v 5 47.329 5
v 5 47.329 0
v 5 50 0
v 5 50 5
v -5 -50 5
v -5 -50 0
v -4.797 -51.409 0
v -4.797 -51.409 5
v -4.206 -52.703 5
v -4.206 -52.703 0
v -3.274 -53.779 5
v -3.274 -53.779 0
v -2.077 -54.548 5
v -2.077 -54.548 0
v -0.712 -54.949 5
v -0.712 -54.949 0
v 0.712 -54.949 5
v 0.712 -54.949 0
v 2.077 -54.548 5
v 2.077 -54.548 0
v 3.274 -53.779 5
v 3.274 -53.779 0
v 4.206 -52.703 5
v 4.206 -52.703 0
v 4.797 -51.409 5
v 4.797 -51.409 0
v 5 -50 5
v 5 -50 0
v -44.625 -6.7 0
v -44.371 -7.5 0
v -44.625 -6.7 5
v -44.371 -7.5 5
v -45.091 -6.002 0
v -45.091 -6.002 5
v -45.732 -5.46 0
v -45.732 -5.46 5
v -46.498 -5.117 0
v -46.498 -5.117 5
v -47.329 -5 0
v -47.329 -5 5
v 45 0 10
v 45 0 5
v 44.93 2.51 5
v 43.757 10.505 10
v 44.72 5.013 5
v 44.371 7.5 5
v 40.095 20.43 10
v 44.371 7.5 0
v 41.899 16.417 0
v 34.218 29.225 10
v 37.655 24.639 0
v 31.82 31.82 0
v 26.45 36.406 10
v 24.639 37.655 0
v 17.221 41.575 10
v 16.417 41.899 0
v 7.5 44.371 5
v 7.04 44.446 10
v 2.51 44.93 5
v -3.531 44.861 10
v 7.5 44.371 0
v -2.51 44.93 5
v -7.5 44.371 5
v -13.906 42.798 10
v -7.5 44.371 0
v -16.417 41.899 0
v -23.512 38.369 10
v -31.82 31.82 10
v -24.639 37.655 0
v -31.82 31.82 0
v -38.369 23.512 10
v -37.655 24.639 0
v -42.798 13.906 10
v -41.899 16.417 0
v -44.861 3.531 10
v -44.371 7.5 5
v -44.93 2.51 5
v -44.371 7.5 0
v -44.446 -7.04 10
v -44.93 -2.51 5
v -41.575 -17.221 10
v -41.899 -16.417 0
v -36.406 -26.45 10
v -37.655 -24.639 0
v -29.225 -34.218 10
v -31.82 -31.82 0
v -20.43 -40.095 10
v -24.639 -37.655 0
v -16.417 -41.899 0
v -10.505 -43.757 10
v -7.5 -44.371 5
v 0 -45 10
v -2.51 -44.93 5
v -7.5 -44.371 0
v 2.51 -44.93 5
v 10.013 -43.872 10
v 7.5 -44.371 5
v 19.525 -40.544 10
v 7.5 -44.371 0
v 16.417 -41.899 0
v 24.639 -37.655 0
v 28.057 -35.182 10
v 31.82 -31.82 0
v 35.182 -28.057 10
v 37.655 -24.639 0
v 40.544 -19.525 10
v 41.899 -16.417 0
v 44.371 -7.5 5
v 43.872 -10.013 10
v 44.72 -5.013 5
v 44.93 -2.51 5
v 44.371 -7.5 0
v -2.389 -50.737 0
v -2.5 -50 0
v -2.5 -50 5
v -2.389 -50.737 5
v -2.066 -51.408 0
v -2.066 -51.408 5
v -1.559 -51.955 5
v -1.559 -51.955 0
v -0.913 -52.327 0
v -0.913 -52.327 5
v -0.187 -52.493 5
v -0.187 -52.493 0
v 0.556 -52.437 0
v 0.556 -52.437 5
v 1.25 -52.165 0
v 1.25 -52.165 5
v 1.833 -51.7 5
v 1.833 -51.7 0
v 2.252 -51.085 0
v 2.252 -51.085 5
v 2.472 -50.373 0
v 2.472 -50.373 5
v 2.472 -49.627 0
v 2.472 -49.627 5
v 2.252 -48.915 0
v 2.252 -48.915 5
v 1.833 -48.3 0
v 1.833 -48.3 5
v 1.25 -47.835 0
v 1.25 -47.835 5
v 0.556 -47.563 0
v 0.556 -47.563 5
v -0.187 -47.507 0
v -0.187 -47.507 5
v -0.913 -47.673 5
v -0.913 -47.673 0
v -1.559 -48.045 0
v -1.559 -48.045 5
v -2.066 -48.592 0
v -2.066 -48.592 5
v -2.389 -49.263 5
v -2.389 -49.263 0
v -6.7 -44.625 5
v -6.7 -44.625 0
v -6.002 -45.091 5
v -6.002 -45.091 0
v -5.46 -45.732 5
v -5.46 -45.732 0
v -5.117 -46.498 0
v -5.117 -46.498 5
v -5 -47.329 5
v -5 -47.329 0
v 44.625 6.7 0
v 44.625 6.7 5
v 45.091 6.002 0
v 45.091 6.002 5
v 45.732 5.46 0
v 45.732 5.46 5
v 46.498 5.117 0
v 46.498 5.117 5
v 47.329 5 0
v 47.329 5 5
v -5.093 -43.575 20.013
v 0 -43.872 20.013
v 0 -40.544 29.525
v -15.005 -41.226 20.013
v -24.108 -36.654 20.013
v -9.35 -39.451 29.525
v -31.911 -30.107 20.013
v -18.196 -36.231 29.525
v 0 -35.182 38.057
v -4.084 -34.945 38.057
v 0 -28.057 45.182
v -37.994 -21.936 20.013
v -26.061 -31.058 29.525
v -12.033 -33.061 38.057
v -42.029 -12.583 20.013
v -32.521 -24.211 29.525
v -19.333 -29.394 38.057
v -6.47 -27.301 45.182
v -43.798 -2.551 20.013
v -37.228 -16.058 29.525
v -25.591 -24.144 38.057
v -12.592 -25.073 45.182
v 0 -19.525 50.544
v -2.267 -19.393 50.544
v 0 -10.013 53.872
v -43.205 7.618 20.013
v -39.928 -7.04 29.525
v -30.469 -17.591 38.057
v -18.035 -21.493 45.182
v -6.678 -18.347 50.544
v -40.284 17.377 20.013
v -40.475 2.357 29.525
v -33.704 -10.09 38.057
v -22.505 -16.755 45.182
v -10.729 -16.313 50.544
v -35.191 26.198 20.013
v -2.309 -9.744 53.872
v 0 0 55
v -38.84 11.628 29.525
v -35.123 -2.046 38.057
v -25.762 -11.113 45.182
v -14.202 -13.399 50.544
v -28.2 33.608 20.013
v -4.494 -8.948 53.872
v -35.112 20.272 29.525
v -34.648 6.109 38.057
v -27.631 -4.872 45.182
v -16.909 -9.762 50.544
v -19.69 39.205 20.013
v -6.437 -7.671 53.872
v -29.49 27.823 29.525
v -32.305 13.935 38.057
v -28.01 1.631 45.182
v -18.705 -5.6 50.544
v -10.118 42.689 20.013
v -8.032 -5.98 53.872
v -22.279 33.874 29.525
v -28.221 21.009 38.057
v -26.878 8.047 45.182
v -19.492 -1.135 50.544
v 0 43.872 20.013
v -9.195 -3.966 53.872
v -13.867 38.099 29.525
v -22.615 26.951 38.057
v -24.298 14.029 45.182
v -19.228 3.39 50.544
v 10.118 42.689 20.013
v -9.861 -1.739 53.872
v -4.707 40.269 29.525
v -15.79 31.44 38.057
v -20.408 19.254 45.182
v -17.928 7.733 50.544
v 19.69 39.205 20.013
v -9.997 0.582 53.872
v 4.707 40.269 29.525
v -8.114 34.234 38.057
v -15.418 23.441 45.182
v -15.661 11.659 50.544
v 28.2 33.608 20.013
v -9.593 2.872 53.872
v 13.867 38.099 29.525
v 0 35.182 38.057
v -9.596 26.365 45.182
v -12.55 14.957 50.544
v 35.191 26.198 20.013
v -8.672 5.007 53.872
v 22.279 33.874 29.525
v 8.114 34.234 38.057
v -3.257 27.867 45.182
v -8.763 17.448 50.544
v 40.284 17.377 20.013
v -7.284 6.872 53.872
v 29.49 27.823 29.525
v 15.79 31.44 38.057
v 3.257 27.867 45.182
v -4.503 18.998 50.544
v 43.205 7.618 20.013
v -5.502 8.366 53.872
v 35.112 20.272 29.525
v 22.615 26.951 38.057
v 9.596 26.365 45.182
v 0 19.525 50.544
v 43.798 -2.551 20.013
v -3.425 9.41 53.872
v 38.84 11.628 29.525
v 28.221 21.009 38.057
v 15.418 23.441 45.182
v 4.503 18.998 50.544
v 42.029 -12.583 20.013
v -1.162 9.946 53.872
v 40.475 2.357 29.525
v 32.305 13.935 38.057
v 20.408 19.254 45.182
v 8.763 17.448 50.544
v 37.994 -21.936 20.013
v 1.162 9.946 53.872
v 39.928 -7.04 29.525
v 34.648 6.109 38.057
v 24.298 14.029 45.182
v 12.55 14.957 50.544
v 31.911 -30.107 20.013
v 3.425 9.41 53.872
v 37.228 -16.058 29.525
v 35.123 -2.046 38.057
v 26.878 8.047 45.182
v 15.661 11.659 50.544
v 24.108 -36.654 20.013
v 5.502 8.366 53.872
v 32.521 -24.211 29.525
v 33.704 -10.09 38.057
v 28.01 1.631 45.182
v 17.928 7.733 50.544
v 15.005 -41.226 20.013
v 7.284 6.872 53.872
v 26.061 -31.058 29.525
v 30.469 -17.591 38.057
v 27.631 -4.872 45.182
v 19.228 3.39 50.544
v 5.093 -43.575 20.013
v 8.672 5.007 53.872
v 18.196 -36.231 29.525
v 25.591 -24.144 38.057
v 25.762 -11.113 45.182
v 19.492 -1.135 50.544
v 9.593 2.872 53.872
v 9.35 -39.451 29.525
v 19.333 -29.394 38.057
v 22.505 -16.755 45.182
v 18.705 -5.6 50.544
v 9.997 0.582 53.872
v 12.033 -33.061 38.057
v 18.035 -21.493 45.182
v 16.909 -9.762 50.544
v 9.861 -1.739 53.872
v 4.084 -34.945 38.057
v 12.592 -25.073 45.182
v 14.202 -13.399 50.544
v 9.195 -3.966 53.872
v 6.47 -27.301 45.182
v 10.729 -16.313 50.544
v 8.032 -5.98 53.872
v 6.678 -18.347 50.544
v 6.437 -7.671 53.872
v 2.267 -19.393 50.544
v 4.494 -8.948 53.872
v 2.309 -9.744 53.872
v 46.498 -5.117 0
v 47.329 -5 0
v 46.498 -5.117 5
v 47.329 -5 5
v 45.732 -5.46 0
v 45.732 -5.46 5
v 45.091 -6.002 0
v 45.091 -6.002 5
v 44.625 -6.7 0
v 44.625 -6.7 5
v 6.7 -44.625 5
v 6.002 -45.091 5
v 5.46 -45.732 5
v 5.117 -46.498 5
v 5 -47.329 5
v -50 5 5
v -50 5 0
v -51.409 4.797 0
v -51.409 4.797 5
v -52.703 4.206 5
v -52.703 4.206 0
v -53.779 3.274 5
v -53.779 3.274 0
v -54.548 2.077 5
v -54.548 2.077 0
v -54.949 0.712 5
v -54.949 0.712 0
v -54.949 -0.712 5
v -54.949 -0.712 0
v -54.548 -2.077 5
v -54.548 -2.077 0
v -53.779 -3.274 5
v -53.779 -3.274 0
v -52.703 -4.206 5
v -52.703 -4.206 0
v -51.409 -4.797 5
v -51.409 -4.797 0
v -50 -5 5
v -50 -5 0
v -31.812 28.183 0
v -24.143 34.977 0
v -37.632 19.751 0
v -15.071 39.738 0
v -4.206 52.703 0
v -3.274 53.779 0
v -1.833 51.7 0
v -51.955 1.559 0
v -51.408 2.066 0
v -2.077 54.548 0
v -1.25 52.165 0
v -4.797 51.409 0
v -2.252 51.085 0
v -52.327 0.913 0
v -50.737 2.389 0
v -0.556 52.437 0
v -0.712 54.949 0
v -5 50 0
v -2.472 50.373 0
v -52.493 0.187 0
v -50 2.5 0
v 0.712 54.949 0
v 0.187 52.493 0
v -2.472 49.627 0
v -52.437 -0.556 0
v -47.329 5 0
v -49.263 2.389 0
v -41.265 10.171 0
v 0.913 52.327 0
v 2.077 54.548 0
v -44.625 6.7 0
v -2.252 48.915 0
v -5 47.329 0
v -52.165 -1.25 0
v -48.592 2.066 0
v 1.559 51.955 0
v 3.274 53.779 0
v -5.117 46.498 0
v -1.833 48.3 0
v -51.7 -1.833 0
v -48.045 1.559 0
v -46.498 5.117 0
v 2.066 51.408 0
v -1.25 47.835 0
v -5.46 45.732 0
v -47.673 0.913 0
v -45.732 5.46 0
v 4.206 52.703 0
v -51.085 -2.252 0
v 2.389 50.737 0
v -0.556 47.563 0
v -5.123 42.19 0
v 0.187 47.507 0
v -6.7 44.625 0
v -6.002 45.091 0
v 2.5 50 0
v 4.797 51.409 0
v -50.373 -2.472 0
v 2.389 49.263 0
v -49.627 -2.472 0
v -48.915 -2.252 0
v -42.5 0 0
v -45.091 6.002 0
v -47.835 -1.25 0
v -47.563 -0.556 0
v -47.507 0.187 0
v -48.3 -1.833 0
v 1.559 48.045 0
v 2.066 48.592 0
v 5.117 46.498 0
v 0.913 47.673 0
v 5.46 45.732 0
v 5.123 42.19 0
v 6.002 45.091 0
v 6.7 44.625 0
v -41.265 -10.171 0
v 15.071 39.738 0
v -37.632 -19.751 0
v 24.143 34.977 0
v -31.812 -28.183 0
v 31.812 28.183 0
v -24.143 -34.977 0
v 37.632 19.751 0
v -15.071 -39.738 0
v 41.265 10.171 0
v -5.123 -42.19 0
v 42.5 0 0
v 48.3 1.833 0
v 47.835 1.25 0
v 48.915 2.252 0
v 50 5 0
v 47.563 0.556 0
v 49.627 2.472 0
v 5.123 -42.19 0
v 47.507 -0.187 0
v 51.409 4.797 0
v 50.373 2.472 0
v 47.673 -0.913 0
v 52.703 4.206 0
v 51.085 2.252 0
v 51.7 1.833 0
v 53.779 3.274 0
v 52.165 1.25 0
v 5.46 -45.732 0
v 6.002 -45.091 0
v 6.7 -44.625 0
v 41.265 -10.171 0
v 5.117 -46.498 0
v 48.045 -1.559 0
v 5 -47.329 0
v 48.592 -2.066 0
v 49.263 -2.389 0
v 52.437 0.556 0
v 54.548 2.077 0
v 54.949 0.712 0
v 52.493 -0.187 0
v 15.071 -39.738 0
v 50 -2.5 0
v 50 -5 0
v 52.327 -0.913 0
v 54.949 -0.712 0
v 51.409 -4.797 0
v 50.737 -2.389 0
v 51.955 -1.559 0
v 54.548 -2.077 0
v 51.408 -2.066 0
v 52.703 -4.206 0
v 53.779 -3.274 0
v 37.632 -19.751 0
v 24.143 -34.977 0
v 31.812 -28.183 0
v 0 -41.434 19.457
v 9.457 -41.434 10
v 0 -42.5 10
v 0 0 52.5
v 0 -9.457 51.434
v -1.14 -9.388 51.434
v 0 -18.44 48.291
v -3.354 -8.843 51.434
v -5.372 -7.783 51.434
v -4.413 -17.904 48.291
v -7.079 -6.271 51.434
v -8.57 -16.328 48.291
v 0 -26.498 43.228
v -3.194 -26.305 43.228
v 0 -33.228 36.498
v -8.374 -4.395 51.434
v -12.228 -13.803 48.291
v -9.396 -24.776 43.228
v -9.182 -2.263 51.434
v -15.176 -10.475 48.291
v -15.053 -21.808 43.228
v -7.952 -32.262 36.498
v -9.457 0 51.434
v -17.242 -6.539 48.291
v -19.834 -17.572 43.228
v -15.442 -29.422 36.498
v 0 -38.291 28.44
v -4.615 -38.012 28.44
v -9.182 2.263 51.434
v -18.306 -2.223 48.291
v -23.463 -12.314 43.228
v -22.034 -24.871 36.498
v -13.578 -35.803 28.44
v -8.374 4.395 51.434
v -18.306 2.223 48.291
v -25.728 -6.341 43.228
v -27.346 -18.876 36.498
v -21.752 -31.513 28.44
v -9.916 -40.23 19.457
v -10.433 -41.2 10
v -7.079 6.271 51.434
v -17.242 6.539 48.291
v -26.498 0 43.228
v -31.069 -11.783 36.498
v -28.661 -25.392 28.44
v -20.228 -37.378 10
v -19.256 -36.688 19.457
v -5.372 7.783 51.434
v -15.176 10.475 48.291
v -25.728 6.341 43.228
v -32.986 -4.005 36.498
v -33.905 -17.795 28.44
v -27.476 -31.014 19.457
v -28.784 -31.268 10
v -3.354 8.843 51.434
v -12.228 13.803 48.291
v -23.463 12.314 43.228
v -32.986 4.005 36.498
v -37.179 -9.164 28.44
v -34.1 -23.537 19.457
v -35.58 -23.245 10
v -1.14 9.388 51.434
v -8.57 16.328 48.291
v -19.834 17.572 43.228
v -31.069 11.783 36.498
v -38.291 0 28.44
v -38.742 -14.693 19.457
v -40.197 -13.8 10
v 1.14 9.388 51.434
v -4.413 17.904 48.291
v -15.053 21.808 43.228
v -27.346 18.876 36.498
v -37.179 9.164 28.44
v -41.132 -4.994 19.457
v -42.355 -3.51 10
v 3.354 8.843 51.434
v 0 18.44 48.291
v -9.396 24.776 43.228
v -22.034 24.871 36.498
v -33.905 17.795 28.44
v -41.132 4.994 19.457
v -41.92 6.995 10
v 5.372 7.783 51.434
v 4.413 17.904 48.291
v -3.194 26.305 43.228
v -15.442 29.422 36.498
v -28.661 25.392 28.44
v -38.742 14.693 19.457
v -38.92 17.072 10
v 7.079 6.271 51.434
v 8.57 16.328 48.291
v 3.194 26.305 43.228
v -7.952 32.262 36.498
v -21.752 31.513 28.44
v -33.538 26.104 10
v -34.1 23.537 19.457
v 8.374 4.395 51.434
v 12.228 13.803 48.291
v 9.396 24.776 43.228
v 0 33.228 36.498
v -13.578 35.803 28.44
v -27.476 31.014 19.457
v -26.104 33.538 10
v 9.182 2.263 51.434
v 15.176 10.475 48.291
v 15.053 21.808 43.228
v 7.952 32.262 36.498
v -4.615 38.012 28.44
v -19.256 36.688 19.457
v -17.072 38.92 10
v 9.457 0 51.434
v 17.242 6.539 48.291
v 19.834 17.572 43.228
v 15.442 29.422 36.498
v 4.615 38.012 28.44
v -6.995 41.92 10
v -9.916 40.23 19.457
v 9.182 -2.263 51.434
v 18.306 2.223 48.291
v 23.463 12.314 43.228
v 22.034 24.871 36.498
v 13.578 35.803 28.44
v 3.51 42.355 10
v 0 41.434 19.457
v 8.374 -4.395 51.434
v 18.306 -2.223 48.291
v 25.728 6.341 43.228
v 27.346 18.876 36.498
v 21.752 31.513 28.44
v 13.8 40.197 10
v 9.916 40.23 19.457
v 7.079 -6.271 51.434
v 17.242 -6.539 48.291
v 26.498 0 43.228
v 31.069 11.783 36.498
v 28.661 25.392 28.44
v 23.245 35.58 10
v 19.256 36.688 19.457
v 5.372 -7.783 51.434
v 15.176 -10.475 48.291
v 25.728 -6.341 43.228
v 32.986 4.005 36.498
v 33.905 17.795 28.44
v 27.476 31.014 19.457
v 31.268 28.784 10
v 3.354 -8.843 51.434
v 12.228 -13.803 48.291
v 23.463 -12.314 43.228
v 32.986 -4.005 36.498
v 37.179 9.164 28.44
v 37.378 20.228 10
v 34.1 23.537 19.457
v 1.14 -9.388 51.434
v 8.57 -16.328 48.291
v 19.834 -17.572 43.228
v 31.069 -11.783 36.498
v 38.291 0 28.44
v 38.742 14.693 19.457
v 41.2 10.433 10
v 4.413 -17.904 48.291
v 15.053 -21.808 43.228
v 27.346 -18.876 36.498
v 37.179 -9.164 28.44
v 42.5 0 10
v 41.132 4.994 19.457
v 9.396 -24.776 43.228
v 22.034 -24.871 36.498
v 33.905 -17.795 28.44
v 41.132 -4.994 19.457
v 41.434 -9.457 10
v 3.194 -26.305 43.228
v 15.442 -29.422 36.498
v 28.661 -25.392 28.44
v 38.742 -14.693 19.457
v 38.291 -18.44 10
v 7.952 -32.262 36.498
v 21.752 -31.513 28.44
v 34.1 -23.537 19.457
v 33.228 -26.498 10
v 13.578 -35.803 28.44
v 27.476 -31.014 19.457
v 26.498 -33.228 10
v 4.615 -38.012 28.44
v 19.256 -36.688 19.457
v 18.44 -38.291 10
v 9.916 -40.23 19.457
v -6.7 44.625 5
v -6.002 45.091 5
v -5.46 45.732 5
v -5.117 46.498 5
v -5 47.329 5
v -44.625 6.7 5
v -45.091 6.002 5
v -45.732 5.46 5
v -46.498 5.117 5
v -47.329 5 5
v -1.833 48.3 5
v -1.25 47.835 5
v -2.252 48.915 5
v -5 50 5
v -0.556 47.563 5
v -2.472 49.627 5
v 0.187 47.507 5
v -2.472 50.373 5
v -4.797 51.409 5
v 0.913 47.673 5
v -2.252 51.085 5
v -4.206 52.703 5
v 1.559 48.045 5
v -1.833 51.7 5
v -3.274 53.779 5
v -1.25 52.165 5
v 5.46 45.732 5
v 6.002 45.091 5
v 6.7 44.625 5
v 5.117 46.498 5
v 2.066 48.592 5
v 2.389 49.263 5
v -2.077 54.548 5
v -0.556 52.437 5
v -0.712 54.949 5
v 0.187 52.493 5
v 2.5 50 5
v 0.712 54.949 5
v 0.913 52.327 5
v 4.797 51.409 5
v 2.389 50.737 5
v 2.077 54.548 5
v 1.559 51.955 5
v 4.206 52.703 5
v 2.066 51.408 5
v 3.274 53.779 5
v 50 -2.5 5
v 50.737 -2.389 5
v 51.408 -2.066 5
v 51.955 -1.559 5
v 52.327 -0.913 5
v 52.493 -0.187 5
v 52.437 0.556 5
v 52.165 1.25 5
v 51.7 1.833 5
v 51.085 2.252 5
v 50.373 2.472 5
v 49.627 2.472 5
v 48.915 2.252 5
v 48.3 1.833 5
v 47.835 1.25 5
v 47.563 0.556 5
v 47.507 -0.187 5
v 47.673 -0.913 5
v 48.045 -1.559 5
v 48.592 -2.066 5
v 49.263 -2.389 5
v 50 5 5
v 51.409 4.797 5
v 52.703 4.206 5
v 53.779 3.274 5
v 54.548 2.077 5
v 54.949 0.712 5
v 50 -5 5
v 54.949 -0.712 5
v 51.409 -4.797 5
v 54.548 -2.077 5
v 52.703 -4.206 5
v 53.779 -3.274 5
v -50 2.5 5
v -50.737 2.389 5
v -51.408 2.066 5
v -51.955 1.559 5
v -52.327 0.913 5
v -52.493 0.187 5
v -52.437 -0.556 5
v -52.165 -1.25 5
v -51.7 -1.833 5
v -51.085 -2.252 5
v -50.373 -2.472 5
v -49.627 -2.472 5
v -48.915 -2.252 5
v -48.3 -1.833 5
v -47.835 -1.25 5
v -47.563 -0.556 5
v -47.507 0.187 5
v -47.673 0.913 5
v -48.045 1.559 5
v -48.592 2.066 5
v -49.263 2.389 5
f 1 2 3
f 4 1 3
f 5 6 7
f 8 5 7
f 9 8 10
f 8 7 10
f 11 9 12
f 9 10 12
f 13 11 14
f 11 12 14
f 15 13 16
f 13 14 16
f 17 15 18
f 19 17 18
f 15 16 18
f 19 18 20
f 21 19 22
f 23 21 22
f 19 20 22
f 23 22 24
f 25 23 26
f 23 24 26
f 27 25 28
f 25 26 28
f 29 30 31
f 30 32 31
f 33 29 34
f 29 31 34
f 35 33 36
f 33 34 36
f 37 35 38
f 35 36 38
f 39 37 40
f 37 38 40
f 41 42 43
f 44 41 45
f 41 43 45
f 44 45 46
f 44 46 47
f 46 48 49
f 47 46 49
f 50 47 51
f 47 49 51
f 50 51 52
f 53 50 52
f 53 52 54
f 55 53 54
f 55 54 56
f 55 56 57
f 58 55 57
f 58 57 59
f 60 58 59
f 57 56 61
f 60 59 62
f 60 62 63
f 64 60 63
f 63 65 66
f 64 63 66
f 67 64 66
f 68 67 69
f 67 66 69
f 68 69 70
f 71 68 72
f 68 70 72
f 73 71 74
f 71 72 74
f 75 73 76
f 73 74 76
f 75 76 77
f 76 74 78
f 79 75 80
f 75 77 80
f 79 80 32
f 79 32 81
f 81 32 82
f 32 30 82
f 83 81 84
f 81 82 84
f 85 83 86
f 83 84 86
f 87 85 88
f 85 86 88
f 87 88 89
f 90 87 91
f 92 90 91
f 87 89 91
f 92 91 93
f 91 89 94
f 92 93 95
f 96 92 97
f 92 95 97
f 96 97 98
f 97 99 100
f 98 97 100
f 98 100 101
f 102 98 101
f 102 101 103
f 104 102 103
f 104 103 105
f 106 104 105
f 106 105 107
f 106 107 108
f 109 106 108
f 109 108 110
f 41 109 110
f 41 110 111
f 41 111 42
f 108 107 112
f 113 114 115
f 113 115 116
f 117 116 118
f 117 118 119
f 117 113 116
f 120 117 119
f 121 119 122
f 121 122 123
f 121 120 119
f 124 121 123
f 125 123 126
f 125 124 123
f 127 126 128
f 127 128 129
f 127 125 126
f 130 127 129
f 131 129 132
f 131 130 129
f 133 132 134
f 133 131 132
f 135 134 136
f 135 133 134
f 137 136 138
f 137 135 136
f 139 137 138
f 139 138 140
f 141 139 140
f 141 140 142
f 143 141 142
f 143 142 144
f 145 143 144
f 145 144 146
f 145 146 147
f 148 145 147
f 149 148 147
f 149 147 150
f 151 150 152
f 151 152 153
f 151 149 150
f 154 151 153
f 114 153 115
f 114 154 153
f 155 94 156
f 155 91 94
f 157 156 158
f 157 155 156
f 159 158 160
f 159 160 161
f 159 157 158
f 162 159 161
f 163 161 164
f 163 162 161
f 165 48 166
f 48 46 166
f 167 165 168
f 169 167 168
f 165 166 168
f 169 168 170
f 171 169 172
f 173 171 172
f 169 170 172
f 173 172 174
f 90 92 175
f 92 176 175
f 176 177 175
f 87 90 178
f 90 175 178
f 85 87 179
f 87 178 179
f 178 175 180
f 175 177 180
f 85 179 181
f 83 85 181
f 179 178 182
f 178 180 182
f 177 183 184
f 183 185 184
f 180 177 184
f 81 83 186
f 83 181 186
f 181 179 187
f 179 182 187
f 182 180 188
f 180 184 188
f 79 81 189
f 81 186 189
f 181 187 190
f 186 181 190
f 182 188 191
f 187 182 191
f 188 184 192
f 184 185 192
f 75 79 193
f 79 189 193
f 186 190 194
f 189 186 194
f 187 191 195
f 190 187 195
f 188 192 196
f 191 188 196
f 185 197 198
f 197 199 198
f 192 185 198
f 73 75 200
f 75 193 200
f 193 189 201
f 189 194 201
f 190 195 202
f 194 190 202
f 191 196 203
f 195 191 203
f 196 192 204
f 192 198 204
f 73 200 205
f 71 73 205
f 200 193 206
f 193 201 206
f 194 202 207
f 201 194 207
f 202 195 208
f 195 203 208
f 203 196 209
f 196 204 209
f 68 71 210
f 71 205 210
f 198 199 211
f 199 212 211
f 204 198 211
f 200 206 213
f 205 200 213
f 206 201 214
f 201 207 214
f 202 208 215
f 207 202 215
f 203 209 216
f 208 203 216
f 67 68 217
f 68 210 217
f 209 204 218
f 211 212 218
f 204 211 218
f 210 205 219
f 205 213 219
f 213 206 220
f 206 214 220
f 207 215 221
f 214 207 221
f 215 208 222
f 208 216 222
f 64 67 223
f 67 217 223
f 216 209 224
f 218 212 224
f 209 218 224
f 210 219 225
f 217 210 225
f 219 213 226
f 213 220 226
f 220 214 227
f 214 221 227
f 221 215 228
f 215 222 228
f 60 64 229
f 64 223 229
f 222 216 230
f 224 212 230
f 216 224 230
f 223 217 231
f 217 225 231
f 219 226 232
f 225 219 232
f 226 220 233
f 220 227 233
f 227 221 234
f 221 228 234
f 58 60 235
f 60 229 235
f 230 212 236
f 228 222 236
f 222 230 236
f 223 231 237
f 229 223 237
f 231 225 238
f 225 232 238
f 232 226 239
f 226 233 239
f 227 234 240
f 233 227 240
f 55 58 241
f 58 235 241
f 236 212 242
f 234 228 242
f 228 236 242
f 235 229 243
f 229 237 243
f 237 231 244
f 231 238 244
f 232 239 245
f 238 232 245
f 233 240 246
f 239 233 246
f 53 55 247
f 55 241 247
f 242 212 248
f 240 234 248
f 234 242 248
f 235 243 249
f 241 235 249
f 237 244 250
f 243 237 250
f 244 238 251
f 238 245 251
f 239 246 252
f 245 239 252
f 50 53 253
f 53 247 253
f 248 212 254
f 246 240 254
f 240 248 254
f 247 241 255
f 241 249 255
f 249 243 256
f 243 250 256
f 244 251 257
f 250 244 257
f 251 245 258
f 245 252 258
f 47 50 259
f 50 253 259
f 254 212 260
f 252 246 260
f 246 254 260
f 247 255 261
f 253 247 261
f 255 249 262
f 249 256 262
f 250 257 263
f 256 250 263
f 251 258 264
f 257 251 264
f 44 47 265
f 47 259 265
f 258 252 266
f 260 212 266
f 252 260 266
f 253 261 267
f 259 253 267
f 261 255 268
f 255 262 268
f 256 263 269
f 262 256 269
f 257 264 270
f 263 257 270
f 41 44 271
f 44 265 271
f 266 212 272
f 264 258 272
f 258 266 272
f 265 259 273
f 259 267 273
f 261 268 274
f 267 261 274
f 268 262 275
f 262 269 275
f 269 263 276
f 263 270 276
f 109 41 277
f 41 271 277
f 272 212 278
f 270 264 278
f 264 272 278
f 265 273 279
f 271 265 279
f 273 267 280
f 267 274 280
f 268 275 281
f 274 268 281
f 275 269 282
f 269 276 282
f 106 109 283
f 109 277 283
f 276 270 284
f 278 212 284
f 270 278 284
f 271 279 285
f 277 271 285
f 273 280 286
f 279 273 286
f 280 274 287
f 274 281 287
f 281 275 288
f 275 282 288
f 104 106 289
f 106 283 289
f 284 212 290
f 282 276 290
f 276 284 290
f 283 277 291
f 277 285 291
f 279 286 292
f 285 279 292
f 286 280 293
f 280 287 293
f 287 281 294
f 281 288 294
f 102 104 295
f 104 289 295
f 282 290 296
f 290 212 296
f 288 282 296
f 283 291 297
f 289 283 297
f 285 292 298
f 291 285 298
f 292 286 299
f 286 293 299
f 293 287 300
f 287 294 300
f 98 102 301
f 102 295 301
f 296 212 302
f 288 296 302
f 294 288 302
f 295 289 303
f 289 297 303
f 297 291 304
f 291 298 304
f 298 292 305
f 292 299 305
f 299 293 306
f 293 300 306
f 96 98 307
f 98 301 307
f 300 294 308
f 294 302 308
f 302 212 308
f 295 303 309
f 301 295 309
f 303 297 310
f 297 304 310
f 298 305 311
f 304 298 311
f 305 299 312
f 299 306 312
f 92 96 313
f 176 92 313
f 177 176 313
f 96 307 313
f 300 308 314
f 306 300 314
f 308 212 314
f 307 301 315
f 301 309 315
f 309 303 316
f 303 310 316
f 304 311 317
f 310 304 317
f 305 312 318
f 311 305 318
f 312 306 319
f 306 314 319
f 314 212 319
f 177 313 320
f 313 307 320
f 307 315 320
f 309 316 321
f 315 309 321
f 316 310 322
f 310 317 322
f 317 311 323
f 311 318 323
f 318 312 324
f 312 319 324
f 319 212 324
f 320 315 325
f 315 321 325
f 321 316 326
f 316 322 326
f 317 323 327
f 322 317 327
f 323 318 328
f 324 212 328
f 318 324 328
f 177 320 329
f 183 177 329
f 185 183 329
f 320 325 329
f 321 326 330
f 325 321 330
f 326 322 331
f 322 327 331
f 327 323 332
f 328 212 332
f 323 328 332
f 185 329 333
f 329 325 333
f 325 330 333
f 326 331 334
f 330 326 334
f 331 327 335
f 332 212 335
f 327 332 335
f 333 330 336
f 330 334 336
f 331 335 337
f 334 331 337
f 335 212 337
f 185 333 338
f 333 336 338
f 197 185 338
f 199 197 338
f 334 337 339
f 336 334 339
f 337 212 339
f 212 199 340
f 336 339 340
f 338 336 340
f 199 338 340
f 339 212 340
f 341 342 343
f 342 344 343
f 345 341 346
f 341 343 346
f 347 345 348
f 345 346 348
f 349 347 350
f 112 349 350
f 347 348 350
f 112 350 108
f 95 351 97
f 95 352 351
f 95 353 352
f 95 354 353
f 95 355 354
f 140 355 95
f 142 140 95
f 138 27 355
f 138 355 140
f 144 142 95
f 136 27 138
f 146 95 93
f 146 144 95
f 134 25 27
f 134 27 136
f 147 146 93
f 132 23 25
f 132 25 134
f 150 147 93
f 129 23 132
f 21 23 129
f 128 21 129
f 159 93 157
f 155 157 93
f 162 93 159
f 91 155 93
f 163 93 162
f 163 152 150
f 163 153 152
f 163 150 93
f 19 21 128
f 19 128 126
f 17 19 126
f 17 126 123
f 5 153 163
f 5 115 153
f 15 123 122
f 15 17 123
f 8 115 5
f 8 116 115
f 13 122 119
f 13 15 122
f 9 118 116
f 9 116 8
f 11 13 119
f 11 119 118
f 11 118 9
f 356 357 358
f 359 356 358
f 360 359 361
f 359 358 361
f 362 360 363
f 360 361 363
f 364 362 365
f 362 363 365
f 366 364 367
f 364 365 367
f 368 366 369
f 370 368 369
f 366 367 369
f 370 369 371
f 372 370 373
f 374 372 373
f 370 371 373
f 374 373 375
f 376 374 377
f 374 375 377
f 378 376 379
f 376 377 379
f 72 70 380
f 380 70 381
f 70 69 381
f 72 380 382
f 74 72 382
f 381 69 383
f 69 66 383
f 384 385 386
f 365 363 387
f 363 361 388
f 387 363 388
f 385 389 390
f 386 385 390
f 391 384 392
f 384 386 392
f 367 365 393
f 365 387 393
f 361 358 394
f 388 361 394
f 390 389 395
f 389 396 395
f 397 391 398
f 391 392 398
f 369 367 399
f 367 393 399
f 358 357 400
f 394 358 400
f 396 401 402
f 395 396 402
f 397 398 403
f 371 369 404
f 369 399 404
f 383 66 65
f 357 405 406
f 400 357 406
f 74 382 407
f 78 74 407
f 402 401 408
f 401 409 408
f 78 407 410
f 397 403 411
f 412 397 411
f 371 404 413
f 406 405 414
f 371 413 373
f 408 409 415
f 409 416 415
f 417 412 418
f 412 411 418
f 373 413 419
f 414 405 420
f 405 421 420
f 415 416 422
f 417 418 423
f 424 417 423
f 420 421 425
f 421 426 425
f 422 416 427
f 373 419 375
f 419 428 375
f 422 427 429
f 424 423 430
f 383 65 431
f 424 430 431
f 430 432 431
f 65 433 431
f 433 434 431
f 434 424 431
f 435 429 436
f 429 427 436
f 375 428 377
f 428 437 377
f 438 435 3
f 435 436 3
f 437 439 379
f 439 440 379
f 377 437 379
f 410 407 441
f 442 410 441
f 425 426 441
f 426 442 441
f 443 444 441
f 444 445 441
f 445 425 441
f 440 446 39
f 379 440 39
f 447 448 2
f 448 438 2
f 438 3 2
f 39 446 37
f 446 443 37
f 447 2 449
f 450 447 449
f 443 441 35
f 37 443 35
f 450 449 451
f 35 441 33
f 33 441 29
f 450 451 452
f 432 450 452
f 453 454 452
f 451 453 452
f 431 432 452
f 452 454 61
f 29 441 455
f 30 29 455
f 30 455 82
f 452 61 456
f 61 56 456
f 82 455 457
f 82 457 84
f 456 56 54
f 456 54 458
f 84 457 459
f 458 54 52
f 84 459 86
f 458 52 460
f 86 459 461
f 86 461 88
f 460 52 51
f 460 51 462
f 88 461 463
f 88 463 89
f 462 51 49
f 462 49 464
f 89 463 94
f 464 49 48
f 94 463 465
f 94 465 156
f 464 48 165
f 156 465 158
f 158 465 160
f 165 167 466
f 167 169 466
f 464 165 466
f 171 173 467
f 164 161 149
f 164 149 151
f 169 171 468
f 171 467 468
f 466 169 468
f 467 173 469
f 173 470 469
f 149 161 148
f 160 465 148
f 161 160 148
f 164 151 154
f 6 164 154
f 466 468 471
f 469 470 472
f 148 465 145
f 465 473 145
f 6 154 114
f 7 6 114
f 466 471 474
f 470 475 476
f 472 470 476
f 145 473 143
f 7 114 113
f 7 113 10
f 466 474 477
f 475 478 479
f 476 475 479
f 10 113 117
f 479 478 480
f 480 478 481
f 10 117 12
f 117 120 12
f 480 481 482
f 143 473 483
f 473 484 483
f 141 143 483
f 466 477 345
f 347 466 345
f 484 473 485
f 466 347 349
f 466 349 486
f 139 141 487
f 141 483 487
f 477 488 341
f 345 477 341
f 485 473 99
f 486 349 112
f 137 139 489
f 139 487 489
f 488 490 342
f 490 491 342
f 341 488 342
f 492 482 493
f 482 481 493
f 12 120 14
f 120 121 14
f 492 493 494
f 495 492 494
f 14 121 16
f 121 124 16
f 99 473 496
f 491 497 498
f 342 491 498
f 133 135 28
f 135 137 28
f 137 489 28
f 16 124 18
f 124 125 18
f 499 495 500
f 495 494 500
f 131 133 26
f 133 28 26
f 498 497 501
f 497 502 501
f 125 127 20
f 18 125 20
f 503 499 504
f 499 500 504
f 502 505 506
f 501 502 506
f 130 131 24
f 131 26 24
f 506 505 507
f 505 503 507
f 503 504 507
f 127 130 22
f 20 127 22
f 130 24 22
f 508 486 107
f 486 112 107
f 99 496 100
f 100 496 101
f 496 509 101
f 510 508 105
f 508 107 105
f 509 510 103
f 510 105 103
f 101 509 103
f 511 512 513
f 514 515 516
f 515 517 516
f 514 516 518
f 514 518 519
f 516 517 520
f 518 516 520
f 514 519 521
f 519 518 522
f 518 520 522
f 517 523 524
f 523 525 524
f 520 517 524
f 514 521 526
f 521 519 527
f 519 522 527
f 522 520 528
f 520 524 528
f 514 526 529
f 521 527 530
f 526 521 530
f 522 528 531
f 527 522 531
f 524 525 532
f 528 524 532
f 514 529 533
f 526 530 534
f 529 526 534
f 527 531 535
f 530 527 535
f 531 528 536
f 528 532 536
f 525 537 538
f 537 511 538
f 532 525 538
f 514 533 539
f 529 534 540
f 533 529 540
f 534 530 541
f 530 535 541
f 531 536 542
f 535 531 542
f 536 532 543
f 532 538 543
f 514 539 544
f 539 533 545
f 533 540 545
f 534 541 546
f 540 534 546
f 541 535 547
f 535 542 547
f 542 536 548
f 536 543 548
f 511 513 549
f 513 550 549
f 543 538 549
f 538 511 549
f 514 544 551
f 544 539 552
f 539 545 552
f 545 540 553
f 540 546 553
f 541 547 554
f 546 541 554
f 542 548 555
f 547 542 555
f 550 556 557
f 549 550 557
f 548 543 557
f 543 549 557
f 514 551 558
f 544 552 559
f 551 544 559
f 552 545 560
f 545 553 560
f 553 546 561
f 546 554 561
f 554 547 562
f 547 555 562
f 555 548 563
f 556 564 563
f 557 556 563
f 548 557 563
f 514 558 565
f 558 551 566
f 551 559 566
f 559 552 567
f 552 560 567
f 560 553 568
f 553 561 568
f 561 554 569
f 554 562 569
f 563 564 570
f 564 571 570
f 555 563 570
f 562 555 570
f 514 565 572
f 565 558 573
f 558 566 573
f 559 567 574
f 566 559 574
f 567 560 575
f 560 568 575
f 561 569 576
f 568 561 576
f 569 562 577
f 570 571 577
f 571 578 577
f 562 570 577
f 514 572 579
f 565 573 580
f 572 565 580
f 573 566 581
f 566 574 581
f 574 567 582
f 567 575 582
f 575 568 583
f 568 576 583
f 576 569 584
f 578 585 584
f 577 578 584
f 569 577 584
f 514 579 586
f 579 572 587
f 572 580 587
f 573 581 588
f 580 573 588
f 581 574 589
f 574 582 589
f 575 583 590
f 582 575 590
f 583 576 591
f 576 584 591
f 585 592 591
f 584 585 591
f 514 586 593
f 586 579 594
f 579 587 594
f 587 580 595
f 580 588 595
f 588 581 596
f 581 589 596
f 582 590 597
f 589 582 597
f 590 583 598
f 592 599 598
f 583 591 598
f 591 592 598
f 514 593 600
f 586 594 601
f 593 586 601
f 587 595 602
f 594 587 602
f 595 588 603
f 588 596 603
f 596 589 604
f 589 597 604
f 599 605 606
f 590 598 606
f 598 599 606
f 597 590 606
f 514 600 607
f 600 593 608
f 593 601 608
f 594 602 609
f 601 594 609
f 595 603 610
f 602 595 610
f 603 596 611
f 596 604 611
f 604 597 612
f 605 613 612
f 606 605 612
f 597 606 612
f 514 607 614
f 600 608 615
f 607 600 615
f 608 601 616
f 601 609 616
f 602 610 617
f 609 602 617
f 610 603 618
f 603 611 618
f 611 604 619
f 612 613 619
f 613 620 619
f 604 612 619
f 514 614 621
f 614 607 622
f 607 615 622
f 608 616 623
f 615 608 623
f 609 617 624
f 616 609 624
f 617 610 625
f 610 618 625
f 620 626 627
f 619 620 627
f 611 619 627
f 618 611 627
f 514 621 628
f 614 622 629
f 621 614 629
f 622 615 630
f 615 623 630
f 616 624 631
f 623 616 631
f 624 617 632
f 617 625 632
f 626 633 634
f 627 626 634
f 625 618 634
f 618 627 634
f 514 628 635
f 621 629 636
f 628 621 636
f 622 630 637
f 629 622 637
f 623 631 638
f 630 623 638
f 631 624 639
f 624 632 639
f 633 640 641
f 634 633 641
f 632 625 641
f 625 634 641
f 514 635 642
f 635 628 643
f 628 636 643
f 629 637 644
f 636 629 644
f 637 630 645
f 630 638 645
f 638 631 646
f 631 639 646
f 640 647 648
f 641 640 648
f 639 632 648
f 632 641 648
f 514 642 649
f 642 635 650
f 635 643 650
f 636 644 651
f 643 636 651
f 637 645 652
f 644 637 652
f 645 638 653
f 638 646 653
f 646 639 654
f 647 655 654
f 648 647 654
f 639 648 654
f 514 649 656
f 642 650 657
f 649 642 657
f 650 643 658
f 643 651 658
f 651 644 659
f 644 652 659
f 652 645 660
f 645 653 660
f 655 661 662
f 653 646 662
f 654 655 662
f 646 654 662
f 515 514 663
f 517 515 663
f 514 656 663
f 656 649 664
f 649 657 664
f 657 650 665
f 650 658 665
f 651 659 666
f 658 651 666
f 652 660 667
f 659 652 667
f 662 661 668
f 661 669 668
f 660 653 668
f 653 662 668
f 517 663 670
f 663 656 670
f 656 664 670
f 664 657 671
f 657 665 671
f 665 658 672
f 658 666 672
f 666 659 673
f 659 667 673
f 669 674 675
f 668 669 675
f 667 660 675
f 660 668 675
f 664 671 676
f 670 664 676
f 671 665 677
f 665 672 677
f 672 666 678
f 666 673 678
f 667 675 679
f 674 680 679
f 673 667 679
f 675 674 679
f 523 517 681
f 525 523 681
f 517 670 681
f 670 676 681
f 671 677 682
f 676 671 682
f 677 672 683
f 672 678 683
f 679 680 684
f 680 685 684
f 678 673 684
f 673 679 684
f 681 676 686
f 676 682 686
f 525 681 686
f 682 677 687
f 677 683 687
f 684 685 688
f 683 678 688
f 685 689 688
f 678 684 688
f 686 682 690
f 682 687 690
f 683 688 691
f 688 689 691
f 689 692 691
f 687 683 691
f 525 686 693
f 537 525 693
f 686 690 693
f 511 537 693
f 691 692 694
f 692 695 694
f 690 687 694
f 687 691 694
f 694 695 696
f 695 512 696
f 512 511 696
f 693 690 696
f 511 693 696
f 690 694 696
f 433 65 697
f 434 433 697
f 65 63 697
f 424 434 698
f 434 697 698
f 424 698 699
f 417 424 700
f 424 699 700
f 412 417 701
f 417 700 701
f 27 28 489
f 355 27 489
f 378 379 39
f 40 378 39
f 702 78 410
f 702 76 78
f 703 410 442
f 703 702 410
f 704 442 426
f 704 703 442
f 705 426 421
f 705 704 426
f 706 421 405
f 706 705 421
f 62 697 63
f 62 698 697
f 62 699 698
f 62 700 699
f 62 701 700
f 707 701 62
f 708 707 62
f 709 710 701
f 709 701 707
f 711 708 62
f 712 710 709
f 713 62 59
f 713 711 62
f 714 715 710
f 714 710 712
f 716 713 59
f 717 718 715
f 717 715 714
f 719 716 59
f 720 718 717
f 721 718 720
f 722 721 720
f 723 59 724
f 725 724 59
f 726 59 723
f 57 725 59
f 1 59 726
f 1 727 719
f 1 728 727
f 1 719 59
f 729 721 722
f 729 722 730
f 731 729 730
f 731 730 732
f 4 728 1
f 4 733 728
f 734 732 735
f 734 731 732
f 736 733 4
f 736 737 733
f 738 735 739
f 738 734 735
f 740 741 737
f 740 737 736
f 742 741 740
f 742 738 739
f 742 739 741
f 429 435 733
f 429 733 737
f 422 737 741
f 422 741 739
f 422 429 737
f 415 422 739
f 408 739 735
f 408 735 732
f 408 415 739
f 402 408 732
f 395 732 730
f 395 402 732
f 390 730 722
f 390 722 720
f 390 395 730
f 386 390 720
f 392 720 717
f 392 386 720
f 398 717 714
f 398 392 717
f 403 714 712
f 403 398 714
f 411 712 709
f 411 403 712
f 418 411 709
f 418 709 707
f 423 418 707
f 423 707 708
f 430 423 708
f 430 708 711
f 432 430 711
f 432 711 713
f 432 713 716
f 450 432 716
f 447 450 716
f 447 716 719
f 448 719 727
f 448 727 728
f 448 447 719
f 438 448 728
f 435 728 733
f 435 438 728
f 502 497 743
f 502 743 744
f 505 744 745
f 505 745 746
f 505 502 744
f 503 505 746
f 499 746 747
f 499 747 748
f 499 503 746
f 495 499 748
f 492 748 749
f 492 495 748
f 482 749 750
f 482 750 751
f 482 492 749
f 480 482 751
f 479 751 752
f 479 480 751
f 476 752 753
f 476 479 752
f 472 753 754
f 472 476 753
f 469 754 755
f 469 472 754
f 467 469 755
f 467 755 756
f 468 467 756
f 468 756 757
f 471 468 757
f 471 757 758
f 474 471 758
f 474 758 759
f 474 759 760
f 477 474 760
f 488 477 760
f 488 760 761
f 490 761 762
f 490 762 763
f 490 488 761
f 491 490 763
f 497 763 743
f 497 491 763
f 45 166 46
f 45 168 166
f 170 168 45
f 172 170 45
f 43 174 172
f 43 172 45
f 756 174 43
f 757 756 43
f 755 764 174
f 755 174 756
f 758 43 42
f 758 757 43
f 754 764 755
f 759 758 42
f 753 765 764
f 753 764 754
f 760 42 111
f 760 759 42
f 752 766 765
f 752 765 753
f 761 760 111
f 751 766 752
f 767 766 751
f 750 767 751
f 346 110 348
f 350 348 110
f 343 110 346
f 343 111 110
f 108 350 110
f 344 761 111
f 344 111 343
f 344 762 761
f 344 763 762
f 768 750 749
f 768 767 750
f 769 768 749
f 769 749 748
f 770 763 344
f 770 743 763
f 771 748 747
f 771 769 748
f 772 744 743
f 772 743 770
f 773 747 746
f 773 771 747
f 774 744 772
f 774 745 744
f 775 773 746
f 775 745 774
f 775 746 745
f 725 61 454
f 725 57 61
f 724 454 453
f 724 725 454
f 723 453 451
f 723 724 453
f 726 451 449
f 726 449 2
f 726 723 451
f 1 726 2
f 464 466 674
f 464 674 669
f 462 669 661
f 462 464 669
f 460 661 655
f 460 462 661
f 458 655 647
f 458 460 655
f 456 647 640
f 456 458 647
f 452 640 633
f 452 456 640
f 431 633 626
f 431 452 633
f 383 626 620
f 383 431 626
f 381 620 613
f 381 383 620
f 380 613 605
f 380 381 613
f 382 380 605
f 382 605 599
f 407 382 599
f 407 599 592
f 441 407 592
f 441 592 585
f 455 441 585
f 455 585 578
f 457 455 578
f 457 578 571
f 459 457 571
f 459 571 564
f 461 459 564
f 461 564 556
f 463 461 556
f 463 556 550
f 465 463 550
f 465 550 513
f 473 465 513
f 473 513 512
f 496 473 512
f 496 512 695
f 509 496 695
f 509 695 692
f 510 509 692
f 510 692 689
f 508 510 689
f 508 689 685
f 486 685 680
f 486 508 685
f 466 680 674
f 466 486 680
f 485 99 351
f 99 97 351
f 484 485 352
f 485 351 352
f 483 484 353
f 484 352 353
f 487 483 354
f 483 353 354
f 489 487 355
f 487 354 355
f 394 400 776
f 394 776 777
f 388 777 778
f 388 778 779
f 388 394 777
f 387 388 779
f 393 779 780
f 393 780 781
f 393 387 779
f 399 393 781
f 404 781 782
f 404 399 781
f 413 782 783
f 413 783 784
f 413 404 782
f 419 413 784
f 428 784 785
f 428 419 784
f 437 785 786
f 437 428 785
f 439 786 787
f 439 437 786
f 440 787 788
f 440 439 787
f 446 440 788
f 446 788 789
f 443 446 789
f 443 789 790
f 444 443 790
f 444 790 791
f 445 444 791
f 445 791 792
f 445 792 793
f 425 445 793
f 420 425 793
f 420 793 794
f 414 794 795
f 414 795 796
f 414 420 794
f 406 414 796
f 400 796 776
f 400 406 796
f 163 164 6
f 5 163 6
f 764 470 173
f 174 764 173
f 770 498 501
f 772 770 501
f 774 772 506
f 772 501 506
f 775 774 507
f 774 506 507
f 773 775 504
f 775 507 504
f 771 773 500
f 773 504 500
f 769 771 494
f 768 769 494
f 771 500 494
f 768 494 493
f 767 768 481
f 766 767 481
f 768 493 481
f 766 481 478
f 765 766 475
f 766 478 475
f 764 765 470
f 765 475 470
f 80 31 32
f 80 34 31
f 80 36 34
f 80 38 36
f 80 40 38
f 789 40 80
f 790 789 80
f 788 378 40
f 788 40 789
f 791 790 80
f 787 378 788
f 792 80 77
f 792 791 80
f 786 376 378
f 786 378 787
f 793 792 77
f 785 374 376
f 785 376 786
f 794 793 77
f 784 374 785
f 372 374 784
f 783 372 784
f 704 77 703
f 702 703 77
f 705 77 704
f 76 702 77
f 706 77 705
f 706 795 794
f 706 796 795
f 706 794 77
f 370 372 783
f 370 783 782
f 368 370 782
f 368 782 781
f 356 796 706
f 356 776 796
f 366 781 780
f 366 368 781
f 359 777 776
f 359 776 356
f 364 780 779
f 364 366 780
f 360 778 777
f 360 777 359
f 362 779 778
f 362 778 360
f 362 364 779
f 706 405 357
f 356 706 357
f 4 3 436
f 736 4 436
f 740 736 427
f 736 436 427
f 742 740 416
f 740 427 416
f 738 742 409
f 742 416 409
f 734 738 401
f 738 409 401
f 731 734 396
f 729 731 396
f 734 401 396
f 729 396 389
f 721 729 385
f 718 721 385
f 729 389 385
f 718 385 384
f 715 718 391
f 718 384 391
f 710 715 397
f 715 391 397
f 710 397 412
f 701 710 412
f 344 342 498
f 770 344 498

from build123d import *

# Parameters (mm, degrees)
SKETCH1_R                = 45
SKETCH1_R_2              = 42.5
BOSS_EXTRUDE1_DEPTH      = 10
SKETCH4_R                = 2.5
BOSS_EXTRUDE2_DEPTH      = 5
FILLET1_R                = 3
CIRPATTERN1_COUNT        = 4
FILLET1_OF_CIRPATTERN1_R = 3


with BuildPart() as part:
    # Sketch1 → Boss-Extrude1 (new body)
    with BuildSketch(Plane.XY):
        Circle(SKETCH1_R)
        Circle(SKETCH1_R_2, mode=Mode.SUBTRACT)
    extrude(amount=BOSS_EXTRUDE1_DEPTH)

    # Sketch3 → Revolve1 (revolve)
    with BuildSketch(Plane(origin=(0, 0, 0), x_dir=(0, 0, -1), z_dir=(1, 0, 0))):
        with BuildLine():
            Line((-55, 0), (-52.5, 0))
            ThreePointArc((-52.5, 0), (-40.0520382, -30.0520382), (-10, -42.5))
            Line((-10, -42.5), (-10, -45))
            ThreePointArc((-10, -45), (-41.819805153, -31.819805153), (-55, 0))
        make_face()
    revolve(axis=Axis((0, 0, 55), (0, 0, -1)))

    # Sketch4 → Boss-Extrude2 (add)
    with BuildSketch(Plane.XY):
        with BuildLine():
            Line((5, 44.72135955), (5, 50))
            ThreePointArc((5, 50), (0, 55), (-5, 50))
            Line((-5, 50), (-5, 44.72135955))
            ThreePointArc((-5, 44.72135955), (0, 45), (5, 44.72135955))
        make_face()
        with Locations((0, 50)):
            Circle(SKETCH4_R, mode=Mode.SUBTRACT)
    boss_extrude2 = extrude(amount=BOSS_EXTRUDE2_DEPTH)

    # Fillet1
    fillet1_edges = [part.edges().sort_by_distance(p)[0] for p in [
        (-5, 44.72135955, 2.5),
        (5, 44.72135955, 2.5),
    ]]
    fillet(fillet1_edges, radius=FILLET1_R)

    # CirPattern1: Boss-Extrude2 ×4 about axis
    cirpattern1_axis = Axis((0, 0, 0), (0, 0, 1))
    for i in range(1, CIRPATTERN1_COUNT):
        add(boss_extrude2.rotate(cirpattern1_axis, i * 360 / CIRPATTERN1_COUNT))

    # Fillet1 of CirPattern1
    fillet1_of_cirpattern1_edges = [part.edges().sort_by_distance(p)[0] for p in [
        (-44.72135955, -5, 2.5),
        (-44.72135955, 5, 2.5),
        (5, -44.72135955, 2.5),
        (-5, -44.72135955, 2.5),
        (44.72135955, 5, 2.5),
        (44.72135955, -5, 2.5),
    ]]
    fillet(fillet1_of_cirpattern1_edges, radius=FILLET1_OF_CIRPATTERN1_R)


solid = part.part
